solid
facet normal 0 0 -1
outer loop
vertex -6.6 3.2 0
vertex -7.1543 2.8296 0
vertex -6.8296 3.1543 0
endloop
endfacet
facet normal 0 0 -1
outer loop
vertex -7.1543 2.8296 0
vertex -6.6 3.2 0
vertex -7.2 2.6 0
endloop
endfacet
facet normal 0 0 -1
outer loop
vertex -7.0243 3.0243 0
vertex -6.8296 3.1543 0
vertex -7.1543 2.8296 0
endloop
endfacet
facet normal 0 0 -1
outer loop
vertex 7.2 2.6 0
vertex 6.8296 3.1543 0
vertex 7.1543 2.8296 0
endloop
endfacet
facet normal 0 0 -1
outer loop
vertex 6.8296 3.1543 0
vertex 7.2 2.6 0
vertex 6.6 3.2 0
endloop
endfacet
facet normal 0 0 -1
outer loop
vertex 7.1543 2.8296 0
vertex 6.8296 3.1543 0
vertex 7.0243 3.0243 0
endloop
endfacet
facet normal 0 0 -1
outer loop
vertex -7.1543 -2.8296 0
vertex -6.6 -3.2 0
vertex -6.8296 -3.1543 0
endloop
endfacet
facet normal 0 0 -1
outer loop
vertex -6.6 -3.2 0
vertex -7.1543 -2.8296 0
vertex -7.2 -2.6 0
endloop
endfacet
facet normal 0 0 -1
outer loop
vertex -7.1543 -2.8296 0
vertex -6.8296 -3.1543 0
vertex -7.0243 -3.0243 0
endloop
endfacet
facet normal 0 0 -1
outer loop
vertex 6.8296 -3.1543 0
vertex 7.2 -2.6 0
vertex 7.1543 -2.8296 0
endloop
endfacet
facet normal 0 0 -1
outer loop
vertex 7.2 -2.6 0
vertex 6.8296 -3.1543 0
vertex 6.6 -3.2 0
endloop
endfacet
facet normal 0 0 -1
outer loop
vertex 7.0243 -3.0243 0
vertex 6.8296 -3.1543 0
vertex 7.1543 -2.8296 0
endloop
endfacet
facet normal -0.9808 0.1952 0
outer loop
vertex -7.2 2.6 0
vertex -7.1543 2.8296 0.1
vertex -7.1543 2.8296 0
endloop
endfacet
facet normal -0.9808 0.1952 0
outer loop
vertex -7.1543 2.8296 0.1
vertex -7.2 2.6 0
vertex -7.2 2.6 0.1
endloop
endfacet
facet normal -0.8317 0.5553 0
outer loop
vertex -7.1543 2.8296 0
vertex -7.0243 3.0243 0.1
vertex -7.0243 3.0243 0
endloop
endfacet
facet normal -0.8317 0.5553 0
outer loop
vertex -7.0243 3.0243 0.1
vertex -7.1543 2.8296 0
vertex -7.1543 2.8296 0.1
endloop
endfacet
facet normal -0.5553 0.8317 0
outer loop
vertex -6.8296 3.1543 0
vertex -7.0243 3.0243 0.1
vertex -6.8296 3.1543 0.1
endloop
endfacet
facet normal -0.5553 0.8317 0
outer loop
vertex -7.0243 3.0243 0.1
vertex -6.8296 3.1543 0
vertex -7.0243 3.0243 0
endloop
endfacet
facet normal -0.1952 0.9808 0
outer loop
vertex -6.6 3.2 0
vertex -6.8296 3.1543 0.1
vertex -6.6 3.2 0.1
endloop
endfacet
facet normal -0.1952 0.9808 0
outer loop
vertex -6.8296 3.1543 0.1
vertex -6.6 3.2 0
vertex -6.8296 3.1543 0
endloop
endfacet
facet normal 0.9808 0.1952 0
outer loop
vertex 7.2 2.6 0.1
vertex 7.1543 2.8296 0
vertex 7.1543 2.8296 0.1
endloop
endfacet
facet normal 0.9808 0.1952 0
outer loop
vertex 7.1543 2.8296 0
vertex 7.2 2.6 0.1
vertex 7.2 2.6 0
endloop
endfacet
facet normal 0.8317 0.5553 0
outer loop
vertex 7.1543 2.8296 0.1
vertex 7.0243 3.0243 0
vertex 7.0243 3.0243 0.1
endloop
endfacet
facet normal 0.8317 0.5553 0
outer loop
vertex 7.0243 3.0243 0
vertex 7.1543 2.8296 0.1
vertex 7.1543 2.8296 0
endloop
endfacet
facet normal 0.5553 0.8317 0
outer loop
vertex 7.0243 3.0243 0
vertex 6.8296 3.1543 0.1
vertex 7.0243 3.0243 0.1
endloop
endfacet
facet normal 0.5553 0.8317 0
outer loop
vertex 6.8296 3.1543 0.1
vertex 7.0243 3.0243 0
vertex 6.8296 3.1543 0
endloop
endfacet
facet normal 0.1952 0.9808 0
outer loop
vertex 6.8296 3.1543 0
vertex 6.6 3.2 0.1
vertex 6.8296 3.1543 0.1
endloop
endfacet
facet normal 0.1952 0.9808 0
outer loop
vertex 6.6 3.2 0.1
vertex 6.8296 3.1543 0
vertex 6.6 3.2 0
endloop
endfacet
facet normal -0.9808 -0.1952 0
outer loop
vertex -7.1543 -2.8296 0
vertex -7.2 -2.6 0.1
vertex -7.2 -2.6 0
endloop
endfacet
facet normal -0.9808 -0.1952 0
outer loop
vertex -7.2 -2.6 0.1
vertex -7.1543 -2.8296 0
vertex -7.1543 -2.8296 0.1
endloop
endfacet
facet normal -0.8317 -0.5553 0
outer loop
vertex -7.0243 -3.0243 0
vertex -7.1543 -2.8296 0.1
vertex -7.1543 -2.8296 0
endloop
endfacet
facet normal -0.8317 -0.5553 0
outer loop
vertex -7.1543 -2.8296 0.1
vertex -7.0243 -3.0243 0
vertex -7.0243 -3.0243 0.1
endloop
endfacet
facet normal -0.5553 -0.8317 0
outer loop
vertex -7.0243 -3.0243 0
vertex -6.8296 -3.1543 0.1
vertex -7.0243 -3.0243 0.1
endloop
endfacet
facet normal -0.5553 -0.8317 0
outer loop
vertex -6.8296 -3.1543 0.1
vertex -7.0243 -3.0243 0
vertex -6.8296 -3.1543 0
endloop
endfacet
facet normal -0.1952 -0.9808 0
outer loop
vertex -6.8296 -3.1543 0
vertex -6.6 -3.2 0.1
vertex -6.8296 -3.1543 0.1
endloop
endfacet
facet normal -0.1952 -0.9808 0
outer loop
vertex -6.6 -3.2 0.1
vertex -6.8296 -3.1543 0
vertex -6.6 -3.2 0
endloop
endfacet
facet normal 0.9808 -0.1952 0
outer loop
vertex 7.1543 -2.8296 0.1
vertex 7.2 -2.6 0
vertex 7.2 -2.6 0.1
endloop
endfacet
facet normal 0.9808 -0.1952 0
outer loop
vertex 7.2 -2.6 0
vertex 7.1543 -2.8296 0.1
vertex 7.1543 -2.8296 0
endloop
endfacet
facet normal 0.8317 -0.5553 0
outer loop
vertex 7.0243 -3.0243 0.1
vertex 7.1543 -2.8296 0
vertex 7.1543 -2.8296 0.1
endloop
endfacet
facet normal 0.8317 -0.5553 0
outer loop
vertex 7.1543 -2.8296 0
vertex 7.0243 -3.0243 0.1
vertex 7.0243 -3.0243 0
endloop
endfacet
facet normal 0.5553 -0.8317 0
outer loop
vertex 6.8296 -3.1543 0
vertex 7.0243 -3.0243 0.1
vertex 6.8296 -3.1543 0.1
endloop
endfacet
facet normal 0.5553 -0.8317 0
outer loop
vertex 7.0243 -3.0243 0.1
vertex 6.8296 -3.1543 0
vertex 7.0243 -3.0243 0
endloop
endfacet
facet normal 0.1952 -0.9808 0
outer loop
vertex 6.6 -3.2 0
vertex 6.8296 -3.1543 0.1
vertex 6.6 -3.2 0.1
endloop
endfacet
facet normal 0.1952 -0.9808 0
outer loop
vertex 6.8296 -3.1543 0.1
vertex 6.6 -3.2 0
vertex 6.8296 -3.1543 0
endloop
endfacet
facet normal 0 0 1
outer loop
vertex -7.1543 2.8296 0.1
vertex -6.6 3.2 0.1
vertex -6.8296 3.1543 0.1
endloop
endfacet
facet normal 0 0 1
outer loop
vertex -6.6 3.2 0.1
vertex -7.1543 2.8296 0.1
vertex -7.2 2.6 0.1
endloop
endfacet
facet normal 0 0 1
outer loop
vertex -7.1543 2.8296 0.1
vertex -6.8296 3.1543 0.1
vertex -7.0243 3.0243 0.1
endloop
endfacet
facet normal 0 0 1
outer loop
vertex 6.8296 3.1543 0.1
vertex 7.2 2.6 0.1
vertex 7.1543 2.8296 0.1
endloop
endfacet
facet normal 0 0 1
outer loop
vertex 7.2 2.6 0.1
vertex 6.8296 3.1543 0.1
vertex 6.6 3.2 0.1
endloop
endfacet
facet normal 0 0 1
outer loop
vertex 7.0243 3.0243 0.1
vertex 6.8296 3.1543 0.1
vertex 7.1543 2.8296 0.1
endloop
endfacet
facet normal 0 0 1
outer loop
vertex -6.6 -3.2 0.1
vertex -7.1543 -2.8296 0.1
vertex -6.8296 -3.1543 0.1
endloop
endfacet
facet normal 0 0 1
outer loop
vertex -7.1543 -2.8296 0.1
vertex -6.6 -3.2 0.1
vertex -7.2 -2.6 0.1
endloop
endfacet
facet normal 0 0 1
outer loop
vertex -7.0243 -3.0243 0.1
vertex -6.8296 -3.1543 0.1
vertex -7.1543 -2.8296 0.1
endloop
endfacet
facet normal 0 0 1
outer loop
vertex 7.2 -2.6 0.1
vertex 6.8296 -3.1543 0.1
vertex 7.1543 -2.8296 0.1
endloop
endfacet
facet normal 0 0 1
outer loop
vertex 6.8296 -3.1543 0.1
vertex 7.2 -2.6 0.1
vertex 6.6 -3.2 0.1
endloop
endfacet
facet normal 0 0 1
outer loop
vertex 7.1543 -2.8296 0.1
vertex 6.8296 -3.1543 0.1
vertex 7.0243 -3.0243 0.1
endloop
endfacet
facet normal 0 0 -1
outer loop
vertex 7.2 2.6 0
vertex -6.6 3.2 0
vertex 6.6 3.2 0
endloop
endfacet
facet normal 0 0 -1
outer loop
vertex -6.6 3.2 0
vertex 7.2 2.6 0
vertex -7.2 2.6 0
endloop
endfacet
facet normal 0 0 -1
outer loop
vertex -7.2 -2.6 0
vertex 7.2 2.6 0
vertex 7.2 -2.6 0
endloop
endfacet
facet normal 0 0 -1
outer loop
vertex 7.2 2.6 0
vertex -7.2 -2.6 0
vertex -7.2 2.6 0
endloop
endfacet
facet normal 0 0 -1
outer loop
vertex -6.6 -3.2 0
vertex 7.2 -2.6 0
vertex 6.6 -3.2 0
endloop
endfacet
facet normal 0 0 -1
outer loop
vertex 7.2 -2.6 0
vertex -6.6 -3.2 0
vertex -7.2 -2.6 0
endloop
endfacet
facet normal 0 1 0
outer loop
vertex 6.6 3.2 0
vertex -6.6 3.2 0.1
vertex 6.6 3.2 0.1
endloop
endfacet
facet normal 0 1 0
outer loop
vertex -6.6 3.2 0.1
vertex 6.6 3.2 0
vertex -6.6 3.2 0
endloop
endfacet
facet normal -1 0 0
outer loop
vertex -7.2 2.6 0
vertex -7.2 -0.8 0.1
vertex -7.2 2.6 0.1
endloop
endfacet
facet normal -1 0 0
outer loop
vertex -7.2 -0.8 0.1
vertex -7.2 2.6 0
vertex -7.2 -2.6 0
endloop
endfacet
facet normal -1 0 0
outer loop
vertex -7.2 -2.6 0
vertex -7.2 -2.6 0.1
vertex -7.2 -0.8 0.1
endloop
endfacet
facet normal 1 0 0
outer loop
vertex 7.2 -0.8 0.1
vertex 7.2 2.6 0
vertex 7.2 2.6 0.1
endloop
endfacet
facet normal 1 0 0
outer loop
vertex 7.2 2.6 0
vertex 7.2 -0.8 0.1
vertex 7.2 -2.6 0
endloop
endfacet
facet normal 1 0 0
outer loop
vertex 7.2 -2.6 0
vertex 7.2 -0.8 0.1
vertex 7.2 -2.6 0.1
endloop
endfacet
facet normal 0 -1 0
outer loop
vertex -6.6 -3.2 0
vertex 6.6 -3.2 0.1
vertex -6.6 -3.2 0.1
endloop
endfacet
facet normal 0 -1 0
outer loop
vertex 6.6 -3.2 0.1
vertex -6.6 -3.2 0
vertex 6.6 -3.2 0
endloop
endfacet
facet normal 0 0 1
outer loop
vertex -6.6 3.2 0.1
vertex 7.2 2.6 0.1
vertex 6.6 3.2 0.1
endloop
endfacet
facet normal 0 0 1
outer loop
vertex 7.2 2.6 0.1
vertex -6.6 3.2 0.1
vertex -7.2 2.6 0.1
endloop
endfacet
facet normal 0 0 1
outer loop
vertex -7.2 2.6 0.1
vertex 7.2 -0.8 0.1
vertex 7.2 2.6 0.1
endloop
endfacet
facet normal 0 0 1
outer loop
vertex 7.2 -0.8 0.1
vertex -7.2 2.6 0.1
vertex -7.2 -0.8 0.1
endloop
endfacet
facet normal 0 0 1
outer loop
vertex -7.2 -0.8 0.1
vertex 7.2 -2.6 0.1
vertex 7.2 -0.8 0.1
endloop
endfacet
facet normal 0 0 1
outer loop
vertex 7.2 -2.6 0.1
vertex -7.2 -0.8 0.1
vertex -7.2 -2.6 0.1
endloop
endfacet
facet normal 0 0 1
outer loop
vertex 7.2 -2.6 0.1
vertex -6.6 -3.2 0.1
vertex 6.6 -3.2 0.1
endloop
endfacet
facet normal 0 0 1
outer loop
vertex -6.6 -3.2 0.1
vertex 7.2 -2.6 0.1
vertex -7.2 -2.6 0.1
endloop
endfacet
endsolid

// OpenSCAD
// file: ../p/1-4cyli.scad
use <../lib.scad>
function ldraw_lib__1_4cyli() = [
// 0 Cylinder 0.25
// 0 Name: 1-4cyli.dat
// 0 Author: James Jessiman
// 0 !LDRAW_ORG Primitive UPDATE 2012-01
// 0 !LICENSE Licensed under CC BY 4.0 : see CAreadme.txt
// 
// 0 BFC CERTIFY CCW
  [0,"BFC","CERTIFY"],
  [0,"BFC","CCW"],
// 
// 0 !HISTORY 2002-03-23 [sbliss] Added BFC statement.
// 0 !HISTORY 2002-04-25 [PTadmin] Official Update 2002-02
// 0 !HISTORY 2007-06-22 [PTadmin] Header formatted for Contributor Agreement
// 0 !HISTORY 2008-07-01 [PTadmin] Official Update 2008-01
// 0 !HISTORY 2012-02-16 [Philo] Changed to CCW
// 0 !HISTORY 2012-03-30 [PTadmin] Official Update 2012-01
// 
// 
// 4 16 1 1 0 0.9239 1 0.3827 0.9239 0 0.3827 1 0 0
  [4,16,1,1,0,0.9239,1,0.3827,0.9239,0,0.3827,1,0,0],
// 5 24 1 0 0 1 1 0 0.9239 0 0.3827 1 0 -1
  [5,24,1,0,0,1,1,0,0.9239,0,0.3827,1,0,-1],
// 4 16 0.9239 1 0.3827 0.7071 1 0.7071 0.7071 0 0.7071 0.9239 0 0.3827
  [4,16,0.9239,1,0.3827,0.7071,1,0.7071,0.7071,0,0.7071,0.9239,0,0.3827],
// 5 24 0.9239 0 0.3827 0.9239 1 0.3827 0.7071 0 0.7071 1 0 0
  [5,24,0.9239,0,0.3827,0.9239,1,0.3827,0.7071,0,0.7071,1,0,0],
// 4 16 0.7071 1 0.7071 0.3827 1 0.9239 0.3827 0 0.9239 0.7071 0 0.7071
  [4,16,0.7071,1,0.7071,0.3827,1,0.9239,0.3827,0,0.9239,0.7071,0,0.7071],
// 5 24 0.7071 0 0.7071 0.7071 1 0.7071 0.3827 0 0.9239 0.9239 0 0.3827
  [5,24,0.7071,0,0.7071,0.7071,1,0.7071,0.3827,0,0.9239,0.9239,0,0.3827],
// 4 16 0.3827 1 0.9239 0 1 1 0 0 1 0.3827 0 0.9239
  [4,16,0.3827,1,0.9239,0,1,1,0,0,1,0.3827,0,0.9239],
// 5 24 0.3827 0 0.9239 0.3827 1 0.9239 0 0 1 0.7071 0 0.7071
  [5,24,0.3827,0,0.9239,0.3827,1,0.9239,0,0,1,0.7071,0,0.7071],
// 5 24 0 0 1 0 1 1 0.3827 0 0.9239 -1 0 1
  [5,24,0,0,1,0,1,1,0.3827,0,0.9239,-1,0,1],
];
module ldraw_lib__1_4cyli(step=0, col=false, unit=2/5, alt=false, line=0.2, solid=!$preview)
    makepoly(ldraw_lib__1_4cyli(), step=step, col=col, unit=unit, alt=alt, line=line, solid=solid);
ldraw_lib__1_4cyli(line=0.2);
// file: ../p/1-4chrd.scad
use <../lib.scad>
function ldraw_lib__1_4chrd() = [
// 0 Chord 0.25
// 0 Name: 1-4chrd.dat
// 0 Author: Tony Hafner [hafhead]
// 0 !LDRAW_ORG Primitive UPDATE 2012-02
// 0 !LICENSE Licensed under CC BY 2.0 and CC BY 4.0 : see CAreadme.txt
// 
// 0 BFC CERTIFY CCW
  [0,"BFC","CERTIFY"],
  [0,"BFC","CCW"],
// 
// 0 !HISTORY 2004-04-22 [PTadmin] Official Update 2004-02
// 0 !HISTORY 2007-10-09 [PTadmin] Header formatted for Contributor Agreement
// 0 !HISTORY 2008-07-01 [PTadmin] Official Update 2008-01
// 0 !HISTORY 2012-08-02 [MMR1988] Re-creation with PrimGen2 and Rectifier
// 0 !HISTORY 2012-08-09 [PTadmin] Official Update 2012-02
// 
// 
// 4 16 0.9239 0 0.3827 0.3827 0 0.9239 0 0 1 1 0 0
  [4,16,0.9239,0,0.3827,0.3827,0,0.9239,0,0,1,1,0,0],
// 3 16 0.7071 0 0.7071 0.3827 0 0.9239 0.9239 0 0.3827
  [3,16,0.7071,0,0.7071,0.3827,0,0.9239,0.9239,0,0.3827],
];
module ldraw_lib__1_4chrd(step=0, col=false, unit=2/5, alt=false, line=0.2, solid=!$preview)
    makepoly(ldraw_lib__1_4chrd(), step=step, col=col, unit=unit, alt=alt, line=line, solid=solid);
ldraw_lib__1_4chrd(line=0.2);
// main file
use <../lib.scad>
use <../p/1-4chrd.scad>
use <../p/1-4cyli.scad>
function ldraw_lib__6141875p() = [
// 0 Sticker  0.8 x  1.8 with Black Stripe on Blue Background
// 0 Name: 6141875p.dat
// 0 Author: Massimo Maso [Sirio]
// 0 !LDRAW_ORG Part UPDATE 2022-06
// 0 !LICENSE Licensed under CC BY 4.0 : see CAreadme.txt
// 
// 0 BFC CERTIFY CCW
  [0,"BFC","CERTIFY"],
  [0,"BFC","CCW"],
// 
// 0 !KEYWORDS Bricklink 75875stk01, Brickowl 53567, F-150, Ford, Raptor
// 0 !KEYWORDS Rebrickable 24760, Set 75875, Speed Champions
// 
// 0 !HISTORY 2022-12-20 [PTadmin] Official Update 2022-06
// 
// 
// 0 // Primitives
// 
// 1 16 -16.5 0 6.5 -1.5 0 0 0 -1 0 0 0 1.5 1-4chrd.dat
  [1,16,-16.5,0,6.5,-1.5,0,0,0,-1,0,0,0,1.5, ldraw_lib__1_4chrd()],
// 1 16 16.5 0 6.5 1.5 0 0 0 -1 0 0 0 1.5 1-4chrd.dat
  [1,16,16.5,0,6.5,1.5,0,0,0,-1,0,0,0,1.5, ldraw_lib__1_4chrd()],
// 1 16 -16.5 0 -6.5 -1.5 0 0 0 -1 0 0 0 -1.5 1-4chrd.dat
  [1,16,-16.5,0,-6.5,-1.5,0,0,0,-1,0,0,0,-1.5, ldraw_lib__1_4chrd()],
// 1 16 16.5 0 -6.5 1.5 0 0 0 -1 0 0 0 -1.5 1-4chrd.dat
  [1,16,16.5,0,-6.5,1.5,0,0,0,-1,0,0,0,-1.5, ldraw_lib__1_4chrd()],
// 1 16 -16.5 0 6.5 -1.5 0 0 0 -.25 0 0 0 1.5 1-4cyli.dat
  [1,16,-16.5,0,6.5,-1.5,0,0,0,-.25,0,0,0,1.5, ldraw_lib__1_4cyli()],
// 1 16 16.5 0 6.5 1.5 0 0 0 -.25 0 0 0 1.5 1-4cyli.dat
  [1,16,16.5,0,6.5,1.5,0,0,0,-.25,0,0,0,1.5, ldraw_lib__1_4cyli()],
// 1 16 -16.5 0 -6.5 -1.5 0 0 0 -.25 0 0 0 -1.5 1-4cyli.dat
  [1,16,-16.5,0,-6.5,-1.5,0,0,0,-.25,0,0,0,-1.5, ldraw_lib__1_4cyli()],
// 1 16 16.5 0 -6.5 1.5 0 0 0 -.25 0 0 0 -1.5 1-4cyli.dat
  [1,16,16.5,0,-6.5,1.5,0,0,0,-.25,0,0,0,-1.5, ldraw_lib__1_4cyli()],
// 1 0 -16.5 -.25 6.5 -1.5 0 0 0 1 0 0 0 1.5 1-4chrd.dat
  [1,0,-16.5,-.25,6.5,-1.5,0,0,0,1,0,0,0,1.5, ldraw_lib__1_4chrd()],
// 1 0 16.5 -.25 6.5 1.5 0 0 0 1 0 0 0 1.5 1-4chrd.dat
  [1,0,16.5,-.25,6.5,1.5,0,0,0,1,0,0,0,1.5, ldraw_lib__1_4chrd()],
// 1 1 -16.5 -.25 -6.5 -1.5 0 0 0 1 0 0 0 -1.5 1-4chrd.dat
  [1,1,-16.5,-.25,-6.5,-1.5,0,0,0,1,0,0,0,-1.5, ldraw_lib__1_4chrd()],
// 1 1 16.5 -.25 -6.5 1.5 0 0 0 1 0 0 0 -1.5 1-4chrd.dat
  [1,1,16.5,-.25,-6.5,1.5,0,0,0,1,0,0,0,-1.5, ldraw_lib__1_4chrd()],
// 0 // Bottom face
// 4 16 16.5 0 8 18 0 6.5 -18 0 6.5 -16.5 0 8
  [4,16,16.5,0,8,18,0,6.5,-18,0,6.5,-16.5,0,8],
// 4 16 18 0 6.5 18 0 -6.5 -18 0 -6.5 -18 0 6.5
  [4,16,18,0,6.5,18,0,-6.5,-18,0,-6.5,-18,0,6.5],
// 4 16 16.5 0 -8 -16.5 0 -8 -18 0 -6.5 18 0 -6.5
  [4,16,16.5,0,-8,-16.5,0,-8,-18,0,-6.5,18,0,-6.5],
// 0 // Lateral face
// 4 16 -16.5 0 8 -16.5 -.25 8 16.5 -.25 8 16.5 0 8
  [4,16,-16.5,0,8,-16.5,-.25,8,16.5,-.25,8,16.5,0,8],
// 4 16 -18 0 6.5 -18 0 -6.5 -18 -.25 -2 -18 -.25 6.5
  [4,16,-18,0,6.5,-18,0,-6.5,-18,-.25,-2,-18,-.25,6.5],
// 3 16 -18 0 -6.5 -18 -.25 -6.5 -18 -.25 -2
  [3,16,-18,0,-6.5,-18,-.25,-6.5,-18,-.25,-2],
// 4 16 18 0 6.5 18 -.25 6.5 18 -.25 -2 18 0 -6.5
  [4,16,18,0,6.5,18,-.25,6.5,18,-.25,-2,18,0,-6.5],
// 3 16 18 0 -6.5 18 -.25 -2 18 -.25 -6.5
  [3,16,18,0,-6.5,18,-.25,-2,18,-.25,-6.5],
// 4 16 -16.5 0 -8 16.5 0 -8 16.5 -.25 -8 -16.5 -.25 -8
  [4,16,-16.5,0,-8,16.5,0,-8,16.5,-.25,-8,-16.5,-.25,-8],
// 0 // Top face
// 0 // Black faces
// 4 0 -18 -.25 6.5 18 -.25 6.5 16.5 -.25 8 -16.5 -.25 8
  [4,0,-18,-.25,6.5,18,-.25,6.5,16.5,-.25,8,-16.5,-.25,8],
// 4 0 -18 -.25 6.5 -18 -.25 -2 18 -.25 -2 18 -.25 6.5
  [4,0,-18,-.25,6.5,-18,-.25,-2,18,-.25,-2,18,-.25,6.5],
// 0 // Blue faces
// 4 1 -18 -.25 -6.5 18 -.25 -6.5 18 -.25 -2 -18 -.25 -2
  [4,1,-18,-.25,-6.5,18,-.25,-6.5,18,-.25,-2,-18,-.25,-2],
// 4 1 -18 -.25 -6.5 -16.5 -.25 -8 16.5 -.25 -8 18 -.25 -6.5
  [4,1,-18,-.25,-6.5,-16.5,-.25,-8,16.5,-.25,-8,18,-.25,-6.5],
];
module ldraw_lib__6141875p(step=0, col=false, unit=2/5, alt=false, line=0.2, solid=!$preview)
    makepoly(ldraw_lib__6141875p(), step=step, col=col, unit=unit, alt=alt, line=line, solid=solid);
ldraw_lib__6141875p(line=0.2);
